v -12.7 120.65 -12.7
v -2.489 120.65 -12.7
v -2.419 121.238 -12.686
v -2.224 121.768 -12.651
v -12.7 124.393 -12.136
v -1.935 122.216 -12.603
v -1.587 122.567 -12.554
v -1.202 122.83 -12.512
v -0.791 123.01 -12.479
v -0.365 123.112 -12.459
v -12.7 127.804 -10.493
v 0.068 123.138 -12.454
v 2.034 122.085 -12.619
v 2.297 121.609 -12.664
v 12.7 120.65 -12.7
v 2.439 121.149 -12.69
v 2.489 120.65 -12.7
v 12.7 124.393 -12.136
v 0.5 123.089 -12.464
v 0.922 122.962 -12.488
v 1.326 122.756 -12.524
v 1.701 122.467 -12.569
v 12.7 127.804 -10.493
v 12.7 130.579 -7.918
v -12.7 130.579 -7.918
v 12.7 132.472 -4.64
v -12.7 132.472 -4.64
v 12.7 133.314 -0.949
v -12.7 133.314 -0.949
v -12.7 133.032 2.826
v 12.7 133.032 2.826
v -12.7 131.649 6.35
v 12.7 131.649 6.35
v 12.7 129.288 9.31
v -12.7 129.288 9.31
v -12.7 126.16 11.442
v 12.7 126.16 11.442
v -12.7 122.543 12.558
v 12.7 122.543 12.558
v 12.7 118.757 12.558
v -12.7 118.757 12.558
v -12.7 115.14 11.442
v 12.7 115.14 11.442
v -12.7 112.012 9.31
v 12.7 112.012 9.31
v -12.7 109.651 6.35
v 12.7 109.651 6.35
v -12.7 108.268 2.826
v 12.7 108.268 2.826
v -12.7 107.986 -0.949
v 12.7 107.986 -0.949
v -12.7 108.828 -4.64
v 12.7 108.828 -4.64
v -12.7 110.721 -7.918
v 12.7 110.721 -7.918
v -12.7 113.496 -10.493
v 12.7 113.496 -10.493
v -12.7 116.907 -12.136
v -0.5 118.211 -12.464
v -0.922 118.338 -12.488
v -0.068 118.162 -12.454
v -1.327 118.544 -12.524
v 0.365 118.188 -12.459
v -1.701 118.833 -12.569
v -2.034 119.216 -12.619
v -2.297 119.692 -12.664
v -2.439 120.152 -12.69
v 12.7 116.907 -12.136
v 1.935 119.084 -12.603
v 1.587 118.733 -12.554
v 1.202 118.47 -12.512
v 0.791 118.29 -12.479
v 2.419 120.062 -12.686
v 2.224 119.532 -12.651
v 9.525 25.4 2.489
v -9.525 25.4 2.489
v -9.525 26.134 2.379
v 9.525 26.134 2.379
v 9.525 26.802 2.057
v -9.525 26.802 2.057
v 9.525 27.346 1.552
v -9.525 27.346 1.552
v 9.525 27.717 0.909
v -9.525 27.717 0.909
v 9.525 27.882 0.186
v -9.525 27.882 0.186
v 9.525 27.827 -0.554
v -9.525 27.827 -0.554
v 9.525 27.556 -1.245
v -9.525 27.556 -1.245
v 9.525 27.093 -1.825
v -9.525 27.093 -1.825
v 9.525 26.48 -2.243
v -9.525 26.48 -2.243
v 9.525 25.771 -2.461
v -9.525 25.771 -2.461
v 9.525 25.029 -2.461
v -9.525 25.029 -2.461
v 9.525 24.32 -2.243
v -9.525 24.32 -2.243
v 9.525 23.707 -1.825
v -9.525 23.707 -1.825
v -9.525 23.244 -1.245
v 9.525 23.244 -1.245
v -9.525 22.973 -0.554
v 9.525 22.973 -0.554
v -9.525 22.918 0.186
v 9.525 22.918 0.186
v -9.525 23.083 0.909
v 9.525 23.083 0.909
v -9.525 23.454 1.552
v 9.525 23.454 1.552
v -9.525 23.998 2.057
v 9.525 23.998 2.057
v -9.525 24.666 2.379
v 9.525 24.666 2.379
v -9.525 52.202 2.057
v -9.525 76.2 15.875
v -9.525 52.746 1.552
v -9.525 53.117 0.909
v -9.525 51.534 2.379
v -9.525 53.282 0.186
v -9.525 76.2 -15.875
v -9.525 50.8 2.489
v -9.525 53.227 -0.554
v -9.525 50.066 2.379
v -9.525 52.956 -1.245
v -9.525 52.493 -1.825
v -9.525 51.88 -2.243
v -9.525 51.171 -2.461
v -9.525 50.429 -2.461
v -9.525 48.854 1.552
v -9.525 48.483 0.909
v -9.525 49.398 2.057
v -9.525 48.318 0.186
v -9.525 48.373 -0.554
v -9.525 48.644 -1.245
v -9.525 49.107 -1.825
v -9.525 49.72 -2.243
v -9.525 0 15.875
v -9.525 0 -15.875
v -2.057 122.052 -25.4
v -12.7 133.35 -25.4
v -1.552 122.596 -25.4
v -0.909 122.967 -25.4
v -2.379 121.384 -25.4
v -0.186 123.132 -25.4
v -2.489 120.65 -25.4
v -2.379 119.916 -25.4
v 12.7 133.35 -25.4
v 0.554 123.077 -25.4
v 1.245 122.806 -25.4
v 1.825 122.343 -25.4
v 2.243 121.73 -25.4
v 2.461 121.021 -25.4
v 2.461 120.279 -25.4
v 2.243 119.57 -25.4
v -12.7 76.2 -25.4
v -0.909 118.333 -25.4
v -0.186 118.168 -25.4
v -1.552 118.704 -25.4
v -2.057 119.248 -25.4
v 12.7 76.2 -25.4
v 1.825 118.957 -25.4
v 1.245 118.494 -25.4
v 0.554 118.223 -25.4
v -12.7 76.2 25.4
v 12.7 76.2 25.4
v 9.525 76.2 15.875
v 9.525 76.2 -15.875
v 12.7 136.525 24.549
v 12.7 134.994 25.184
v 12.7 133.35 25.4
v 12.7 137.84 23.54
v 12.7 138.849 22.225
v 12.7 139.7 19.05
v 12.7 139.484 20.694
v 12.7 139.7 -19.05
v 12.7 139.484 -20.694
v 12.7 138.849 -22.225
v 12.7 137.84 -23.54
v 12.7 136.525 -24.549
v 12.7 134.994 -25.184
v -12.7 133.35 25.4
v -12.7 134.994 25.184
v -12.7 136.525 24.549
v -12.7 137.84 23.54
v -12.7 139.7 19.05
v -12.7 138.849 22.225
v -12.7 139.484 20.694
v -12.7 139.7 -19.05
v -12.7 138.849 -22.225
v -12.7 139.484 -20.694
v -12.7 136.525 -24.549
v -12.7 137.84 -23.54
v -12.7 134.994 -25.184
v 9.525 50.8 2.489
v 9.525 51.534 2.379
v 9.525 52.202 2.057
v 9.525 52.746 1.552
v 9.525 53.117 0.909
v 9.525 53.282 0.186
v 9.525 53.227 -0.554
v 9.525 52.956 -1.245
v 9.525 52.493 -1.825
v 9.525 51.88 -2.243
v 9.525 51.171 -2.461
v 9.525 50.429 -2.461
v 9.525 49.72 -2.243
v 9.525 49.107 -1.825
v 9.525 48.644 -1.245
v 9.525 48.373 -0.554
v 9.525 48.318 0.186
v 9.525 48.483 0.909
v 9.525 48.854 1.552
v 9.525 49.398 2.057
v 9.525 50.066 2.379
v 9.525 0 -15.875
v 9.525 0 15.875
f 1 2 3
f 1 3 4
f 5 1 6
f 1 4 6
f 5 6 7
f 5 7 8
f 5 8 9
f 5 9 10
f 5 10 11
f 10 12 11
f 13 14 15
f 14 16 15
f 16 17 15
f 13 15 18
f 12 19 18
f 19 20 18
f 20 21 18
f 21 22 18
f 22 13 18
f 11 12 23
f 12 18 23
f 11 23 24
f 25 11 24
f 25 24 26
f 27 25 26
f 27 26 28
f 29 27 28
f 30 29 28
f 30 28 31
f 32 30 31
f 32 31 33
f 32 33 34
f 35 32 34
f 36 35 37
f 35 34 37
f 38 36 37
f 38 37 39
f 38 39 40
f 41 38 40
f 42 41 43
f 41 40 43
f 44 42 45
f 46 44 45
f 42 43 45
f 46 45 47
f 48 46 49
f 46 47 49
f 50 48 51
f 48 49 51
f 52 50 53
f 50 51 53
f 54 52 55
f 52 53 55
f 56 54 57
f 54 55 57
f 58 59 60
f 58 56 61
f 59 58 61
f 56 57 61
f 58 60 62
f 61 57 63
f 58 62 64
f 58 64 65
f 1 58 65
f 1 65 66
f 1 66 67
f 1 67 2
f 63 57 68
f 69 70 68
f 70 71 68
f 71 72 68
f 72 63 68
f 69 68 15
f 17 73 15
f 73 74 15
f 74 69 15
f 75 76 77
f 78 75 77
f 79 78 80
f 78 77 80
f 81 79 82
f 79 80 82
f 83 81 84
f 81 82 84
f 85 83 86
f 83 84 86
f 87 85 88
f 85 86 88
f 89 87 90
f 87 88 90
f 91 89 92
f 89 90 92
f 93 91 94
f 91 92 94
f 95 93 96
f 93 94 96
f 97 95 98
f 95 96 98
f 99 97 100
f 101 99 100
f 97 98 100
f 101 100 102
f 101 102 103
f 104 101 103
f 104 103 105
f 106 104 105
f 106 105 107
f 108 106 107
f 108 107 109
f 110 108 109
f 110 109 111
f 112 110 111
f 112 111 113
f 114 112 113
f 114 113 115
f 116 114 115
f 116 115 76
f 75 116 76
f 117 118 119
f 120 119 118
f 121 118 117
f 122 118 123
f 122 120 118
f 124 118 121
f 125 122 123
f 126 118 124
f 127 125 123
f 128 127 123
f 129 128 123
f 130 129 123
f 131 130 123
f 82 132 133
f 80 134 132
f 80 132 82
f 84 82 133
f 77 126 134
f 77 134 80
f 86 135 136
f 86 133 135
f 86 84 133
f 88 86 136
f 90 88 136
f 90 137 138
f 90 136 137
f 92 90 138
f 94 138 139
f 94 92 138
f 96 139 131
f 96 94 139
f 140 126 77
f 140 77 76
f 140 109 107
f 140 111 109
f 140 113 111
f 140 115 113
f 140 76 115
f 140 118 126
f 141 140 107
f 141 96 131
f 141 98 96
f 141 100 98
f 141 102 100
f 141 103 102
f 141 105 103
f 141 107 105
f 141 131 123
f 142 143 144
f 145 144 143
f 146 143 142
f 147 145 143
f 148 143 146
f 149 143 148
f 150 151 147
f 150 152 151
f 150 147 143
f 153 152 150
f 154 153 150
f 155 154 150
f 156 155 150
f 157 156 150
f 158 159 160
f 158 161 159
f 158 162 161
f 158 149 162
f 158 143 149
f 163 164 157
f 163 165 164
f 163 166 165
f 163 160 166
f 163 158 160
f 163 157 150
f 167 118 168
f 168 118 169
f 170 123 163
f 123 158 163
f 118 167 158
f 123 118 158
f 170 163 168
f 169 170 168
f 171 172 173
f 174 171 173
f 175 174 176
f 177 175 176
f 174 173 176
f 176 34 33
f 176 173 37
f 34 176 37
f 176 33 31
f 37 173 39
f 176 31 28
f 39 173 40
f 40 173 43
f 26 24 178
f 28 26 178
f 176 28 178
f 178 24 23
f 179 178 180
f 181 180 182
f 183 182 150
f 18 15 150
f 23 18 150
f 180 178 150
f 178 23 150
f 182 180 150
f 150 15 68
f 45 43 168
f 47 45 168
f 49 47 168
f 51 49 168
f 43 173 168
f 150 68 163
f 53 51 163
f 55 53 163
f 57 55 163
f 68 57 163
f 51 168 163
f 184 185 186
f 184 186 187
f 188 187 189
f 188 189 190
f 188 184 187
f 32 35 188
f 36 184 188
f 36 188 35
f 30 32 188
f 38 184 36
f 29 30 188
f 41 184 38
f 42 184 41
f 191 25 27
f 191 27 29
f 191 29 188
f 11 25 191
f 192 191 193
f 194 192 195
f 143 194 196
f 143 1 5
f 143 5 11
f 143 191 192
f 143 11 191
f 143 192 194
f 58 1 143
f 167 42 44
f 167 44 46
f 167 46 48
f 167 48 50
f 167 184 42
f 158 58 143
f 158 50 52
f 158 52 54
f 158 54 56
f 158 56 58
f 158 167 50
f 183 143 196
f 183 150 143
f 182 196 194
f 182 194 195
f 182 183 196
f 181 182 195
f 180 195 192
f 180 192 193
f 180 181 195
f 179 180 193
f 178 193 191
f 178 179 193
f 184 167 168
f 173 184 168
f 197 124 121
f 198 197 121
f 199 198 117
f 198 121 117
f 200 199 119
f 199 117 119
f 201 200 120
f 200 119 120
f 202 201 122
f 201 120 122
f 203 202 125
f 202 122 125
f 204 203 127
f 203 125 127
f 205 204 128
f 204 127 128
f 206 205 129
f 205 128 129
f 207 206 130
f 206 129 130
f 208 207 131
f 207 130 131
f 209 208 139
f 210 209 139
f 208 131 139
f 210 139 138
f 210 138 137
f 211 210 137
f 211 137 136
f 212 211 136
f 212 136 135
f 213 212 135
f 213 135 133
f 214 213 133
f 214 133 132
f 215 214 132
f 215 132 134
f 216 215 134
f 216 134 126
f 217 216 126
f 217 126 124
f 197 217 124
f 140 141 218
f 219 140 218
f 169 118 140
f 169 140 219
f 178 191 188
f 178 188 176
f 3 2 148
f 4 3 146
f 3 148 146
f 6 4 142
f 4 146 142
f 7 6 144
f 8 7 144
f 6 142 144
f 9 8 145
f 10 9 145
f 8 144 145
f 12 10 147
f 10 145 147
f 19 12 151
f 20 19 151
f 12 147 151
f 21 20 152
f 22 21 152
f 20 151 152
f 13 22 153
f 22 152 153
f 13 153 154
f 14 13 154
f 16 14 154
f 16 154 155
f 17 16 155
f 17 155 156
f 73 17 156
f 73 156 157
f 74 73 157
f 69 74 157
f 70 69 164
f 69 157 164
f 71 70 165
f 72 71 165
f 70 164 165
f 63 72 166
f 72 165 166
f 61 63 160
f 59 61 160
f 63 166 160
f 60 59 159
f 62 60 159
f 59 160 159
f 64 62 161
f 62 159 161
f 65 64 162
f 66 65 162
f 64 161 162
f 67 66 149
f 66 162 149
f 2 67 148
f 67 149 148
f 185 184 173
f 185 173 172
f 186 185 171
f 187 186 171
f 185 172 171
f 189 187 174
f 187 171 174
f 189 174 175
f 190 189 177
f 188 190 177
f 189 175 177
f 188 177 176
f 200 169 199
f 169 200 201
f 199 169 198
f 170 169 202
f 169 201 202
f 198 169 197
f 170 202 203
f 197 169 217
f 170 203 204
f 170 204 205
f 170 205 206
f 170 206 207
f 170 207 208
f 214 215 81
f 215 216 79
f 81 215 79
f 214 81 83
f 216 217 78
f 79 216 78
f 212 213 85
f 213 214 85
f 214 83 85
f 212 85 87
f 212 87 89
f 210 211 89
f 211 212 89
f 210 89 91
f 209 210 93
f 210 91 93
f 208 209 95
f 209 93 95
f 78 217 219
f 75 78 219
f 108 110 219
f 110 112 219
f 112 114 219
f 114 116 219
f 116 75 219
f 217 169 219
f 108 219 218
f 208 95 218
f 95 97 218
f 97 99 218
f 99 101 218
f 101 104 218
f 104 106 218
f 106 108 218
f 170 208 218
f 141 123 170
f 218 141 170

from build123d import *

# Parameters (mm, degrees)
SKETCH2_W               = 19.05
SKETCH2_H               = 31.75
BOSS_EXTRUDE1_DEPTH     = 76.2
SKETCH3_W               = 25.4
SKETCH3_H               = 50.8
BOSS_EXTRUDE2_DEPTH     = 63.5
FILLET1_R               = 6.35
SKETCH4_R               = 12.7
CUT_EXTRUDE1_DEPTH      = 145.244271983
CUT_EXTRUDE2_REACH      = 151.191
CUT_EXTRUDE2_END_RADIUS = 12.7
SKETCH5_R               = 2.4892
CUT_EXTRUDE3_REACH      = 145.719
SKETCH6_R               = 2.4892


with BuildPart() as part:
    # Sketch2 → Boss-Extrude1 (new body)
    with BuildSketch(Plane(origin=(0, 0, 0), x_dir=(1, 0, 0), z_dir=(0, 1, 0))):
        Rectangle(SKETCH2_W, SKETCH2_H)
    extrude(amount=BOSS_EXTRUDE1_DEPTH)

    # Sketch3 → Boss-Extrude2 (add)
    with BuildSketch(Plane(origin=(0, 76.2, 0), x_dir=(1, 0, 0), z_dir=(0, 1, 0))):
        Rectangle(SKETCH3_W, SKETCH3_H)
    extrude(amount=BOSS_EXTRUDE2_DEPTH)

    # Fillet1
    fillet1_edges = [part.edges().sort_by_distance(p)[0] for p in [
        (0, 139.7, -25.4),
        (0, 139.7, 25.4),
    ]]
    fillet(fillet1_edges, radius=FILLET1_R)

    # Sketch4 → Cut-Extrude1 (cut, through all)
    with BuildSketch(Plane(origin=(12.7, 0, 0), x_dir=(0, 0, -1), z_dir=(1, 0, 0))):
        with Locations((0, 120.65)):
            Circle(SKETCH4_R)
    extrude(amount=-CUT_EXTRUDE1_DEPTH, mode=Mode.SUBTRACT)

    # Cut-Extrude2: up to this cylinder (the profile starts outside it)
    cut_extrude2_end = Plane(origin=(0, 120.65, 0), z_dir=(1, 0, 0)) * Cylinder(CUT_EXTRUDE2_END_RADIUS, 328.782, mode=Mode.PRIVATE)
    # Sketch5 → Cut-Extrude2 (cut, up to the surface)
    with BuildSketch(Plane(origin=(0, 0, -25.4), x_dir=(-1, 0, 0), z_dir=(0, 0, -1)), mode=Mode.PRIVATE) as cut_extrude2_sk1:
        with Locations((0, 120.65)):
            Circle(SKETCH5_R)
    cut_extrude2_tool1 = extrude(cut_extrude2_sk1.sketch, amount=-CUT_EXTRUDE2_REACH, mode=Mode.PRIVATE) - cut_extrude2_end
    add(cut_extrude2_tool1.solids().sort_by_distance((0, 120.65, -25.4))[0], mode=Mode.SUBTRACT)

    # Sketch6 → Cut-Extrude3 (cut, up to next)
    with BuildSketch(Plane.ZY.offset(9.525), mode=Mode.PRIVATE) as cut_extrude3_sk1:
        with Locations((0, 25.4)):
            Circle(SKETCH6_R)
    cut_extrude3_tool1 = extrude(cut_extrude3_sk1.sketch, amount=-CUT_EXTRUDE3_REACH, mode=Mode.PRIVATE) & part.part
    # Sketch6 → Cut-Extrude3 (cut, up to next)
    with BuildSketch(Plane.ZY.offset(9.525), mode=Mode.PRIVATE) as cut_extrude3_sk2:
        with Locations((0, 50.8)):
            Circle(SKETCH6_R)
    cut_extrude3_tool2 = extrude(cut_extrude3_sk2.sketch, amount=-CUT_EXTRUDE3_REACH, mode=Mode.PRIVATE) & part.part
    add(cut_extrude3_tool1.solids().sort_by_distance((-9.525, 25.4, 0))[0], mode=Mode.SUBTRACT)
    add(cut_extrude3_tool2.solids().sort_by_distance((-9.525, 50.8, 0))[0], mode=Mode.SUBTRACT)


solid = part.part
